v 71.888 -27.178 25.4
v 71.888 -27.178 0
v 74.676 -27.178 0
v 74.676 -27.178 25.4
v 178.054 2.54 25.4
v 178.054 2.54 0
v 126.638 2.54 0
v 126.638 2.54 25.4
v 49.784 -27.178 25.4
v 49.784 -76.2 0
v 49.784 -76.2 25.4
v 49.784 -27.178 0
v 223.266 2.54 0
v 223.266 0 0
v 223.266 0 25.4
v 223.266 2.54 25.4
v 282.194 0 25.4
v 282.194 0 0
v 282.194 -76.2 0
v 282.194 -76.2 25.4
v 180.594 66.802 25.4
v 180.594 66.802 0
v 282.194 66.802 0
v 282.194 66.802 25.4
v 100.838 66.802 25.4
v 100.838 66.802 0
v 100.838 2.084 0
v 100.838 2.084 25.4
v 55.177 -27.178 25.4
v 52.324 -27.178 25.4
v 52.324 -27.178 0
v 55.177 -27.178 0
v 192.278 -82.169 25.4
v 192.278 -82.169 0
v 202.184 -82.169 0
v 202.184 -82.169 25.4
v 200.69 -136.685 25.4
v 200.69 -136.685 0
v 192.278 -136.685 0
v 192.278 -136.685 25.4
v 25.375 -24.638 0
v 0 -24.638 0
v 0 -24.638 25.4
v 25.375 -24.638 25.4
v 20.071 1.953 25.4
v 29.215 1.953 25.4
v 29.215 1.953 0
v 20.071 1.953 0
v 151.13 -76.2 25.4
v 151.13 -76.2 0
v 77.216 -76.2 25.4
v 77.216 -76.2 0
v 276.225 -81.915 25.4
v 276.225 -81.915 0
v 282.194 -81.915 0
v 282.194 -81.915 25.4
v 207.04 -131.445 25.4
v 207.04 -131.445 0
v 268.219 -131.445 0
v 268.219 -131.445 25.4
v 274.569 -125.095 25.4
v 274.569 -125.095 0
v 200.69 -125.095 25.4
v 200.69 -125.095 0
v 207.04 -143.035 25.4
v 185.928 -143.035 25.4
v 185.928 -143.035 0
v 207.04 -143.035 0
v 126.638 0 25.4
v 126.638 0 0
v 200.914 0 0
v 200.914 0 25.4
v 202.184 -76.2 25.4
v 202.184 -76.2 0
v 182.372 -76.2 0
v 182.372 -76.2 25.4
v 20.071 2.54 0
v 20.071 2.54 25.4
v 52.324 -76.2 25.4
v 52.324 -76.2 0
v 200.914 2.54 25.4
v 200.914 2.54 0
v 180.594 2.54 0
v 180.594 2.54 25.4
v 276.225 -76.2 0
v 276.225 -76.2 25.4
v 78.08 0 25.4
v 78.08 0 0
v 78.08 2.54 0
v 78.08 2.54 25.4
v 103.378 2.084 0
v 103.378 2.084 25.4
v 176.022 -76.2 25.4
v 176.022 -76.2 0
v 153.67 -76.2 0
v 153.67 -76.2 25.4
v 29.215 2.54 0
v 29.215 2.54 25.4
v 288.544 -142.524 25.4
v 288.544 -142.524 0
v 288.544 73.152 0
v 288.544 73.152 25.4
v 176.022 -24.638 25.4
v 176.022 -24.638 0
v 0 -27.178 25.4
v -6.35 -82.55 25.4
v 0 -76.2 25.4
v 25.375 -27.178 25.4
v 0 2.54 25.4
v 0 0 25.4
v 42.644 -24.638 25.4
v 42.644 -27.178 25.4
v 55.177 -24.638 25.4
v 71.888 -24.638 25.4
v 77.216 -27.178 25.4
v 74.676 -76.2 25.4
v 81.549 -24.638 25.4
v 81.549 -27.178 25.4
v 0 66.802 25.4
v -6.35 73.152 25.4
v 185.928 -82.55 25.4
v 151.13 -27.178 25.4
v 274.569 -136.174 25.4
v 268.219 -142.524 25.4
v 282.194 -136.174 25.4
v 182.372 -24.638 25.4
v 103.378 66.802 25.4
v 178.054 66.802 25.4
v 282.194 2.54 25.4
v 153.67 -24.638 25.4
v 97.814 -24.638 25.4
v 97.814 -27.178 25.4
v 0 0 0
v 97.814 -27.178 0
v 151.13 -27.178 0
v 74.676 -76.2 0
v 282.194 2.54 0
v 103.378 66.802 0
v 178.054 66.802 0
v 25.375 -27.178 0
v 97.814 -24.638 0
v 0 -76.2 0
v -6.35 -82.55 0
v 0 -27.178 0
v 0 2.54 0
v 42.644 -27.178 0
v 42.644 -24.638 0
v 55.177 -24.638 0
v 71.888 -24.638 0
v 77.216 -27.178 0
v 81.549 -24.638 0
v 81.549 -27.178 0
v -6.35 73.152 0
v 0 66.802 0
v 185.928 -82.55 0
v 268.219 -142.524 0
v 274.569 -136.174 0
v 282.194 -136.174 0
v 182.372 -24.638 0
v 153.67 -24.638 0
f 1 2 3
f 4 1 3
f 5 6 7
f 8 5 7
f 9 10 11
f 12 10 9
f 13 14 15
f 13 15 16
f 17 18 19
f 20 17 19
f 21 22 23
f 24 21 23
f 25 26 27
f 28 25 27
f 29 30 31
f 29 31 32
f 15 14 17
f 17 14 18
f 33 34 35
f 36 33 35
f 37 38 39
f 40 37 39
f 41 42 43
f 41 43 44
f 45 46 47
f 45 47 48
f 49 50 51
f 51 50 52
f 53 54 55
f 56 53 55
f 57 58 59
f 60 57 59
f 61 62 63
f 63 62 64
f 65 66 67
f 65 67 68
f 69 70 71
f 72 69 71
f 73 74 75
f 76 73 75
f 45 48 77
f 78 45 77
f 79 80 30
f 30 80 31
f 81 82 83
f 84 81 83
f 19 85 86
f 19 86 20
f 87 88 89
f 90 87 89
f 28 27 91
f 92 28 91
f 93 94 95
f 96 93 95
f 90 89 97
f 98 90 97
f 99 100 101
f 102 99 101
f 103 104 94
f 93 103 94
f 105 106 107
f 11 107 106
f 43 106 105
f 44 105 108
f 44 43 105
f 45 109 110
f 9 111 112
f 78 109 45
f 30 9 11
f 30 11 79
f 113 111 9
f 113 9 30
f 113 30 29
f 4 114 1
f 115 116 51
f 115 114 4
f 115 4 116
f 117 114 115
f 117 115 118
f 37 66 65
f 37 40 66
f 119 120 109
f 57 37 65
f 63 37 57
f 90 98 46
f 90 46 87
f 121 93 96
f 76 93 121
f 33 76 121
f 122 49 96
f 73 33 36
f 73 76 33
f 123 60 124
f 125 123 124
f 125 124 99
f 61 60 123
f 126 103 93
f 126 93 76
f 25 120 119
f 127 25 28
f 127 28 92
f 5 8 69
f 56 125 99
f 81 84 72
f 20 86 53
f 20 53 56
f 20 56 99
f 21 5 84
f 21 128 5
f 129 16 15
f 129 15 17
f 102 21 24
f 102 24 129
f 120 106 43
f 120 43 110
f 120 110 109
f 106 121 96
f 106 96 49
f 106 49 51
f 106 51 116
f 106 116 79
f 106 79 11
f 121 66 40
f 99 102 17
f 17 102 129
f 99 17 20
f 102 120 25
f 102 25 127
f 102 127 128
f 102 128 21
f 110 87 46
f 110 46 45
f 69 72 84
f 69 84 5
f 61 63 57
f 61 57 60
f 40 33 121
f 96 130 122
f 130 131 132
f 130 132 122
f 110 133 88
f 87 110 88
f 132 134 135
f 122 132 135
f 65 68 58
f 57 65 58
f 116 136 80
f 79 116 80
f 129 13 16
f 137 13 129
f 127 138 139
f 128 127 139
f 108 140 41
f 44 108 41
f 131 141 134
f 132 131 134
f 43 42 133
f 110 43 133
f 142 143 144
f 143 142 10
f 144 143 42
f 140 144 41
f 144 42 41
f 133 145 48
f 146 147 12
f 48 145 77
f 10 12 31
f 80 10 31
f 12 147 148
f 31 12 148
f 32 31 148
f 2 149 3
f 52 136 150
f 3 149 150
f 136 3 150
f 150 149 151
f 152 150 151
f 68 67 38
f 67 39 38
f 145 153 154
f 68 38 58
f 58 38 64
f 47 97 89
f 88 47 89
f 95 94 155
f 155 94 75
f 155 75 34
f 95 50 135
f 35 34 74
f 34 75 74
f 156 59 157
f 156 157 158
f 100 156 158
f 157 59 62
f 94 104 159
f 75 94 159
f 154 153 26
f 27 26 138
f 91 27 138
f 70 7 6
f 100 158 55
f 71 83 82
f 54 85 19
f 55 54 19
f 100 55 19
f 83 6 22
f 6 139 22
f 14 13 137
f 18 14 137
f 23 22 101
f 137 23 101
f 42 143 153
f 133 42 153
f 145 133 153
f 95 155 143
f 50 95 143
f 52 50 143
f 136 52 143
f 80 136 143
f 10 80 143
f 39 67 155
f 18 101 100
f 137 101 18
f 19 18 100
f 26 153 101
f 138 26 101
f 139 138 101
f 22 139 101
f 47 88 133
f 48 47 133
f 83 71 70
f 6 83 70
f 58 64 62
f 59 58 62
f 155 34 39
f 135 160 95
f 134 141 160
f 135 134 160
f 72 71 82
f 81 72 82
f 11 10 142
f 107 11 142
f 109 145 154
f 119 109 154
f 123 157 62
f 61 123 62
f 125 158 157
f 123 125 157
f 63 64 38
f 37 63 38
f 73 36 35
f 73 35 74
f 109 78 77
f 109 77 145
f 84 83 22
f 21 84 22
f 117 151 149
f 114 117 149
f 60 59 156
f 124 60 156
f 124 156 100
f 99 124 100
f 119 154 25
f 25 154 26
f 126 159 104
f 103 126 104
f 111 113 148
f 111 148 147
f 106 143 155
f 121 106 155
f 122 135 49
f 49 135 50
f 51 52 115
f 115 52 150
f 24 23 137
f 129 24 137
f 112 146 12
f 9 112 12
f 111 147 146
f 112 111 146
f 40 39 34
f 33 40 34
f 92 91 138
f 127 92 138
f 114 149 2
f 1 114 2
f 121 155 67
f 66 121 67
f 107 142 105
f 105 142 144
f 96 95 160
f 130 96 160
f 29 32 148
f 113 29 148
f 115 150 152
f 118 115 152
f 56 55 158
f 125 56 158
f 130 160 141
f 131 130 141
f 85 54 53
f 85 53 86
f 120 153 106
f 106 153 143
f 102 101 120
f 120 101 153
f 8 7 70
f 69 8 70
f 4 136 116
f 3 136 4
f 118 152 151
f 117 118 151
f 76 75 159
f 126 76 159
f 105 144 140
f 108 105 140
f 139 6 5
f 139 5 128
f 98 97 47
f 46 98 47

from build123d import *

# Parameters (mm, degrees)
F0_W     = 2.54
F0_H     = 64.262
F0_W_2   = 58.928
F0_H_2   = 2.54
F0_W_3   = 9.906
F0_H_3   = 5.969
F0_W_4   = 5.969
F0_H_4   = 5.715
F0_H_5   = 49.022
F0_W_5   = 25.3746
F1_DEPTH = 25.4


# Not quite as in the source:
# - a feature names something its author has since deleted; it is built from what else it names


with BuildPart() as f1:
    # F0 (on Top) → F1 (new body)
    with BuildSketch(Plane.XY):
        Polygon((-6.35, 73.152), (-6.35, -82.55), (185.928, -82.55), (185.928, -143.0351776838), (207.0404606759, -143.0351776838), (207.0404606759, -131.445), (268.2187365532, -131.445), (268.2187365532, -142.524239029), (288.544, -142.524239029), (288.544, -81.915), (288.544, 73.152), align=None)
        Polygon((0, 61.5773126483), (0, 66.802), (77.6735246181, 66.802), (100.838, 66.802), (103.378, 66.802), (178.054, 66.802), (180.594, 66.802), (282.194, 66.802), (282.194, 48.7640425563), (282.194, 2.54), (282.194, 0), (282.194, -64.607180655), (282.194, -76.2), (282.194, -81.915), (282.194, -136.174239029), (274.5687365532, -136.174239029), (274.5687365532, -125.095), (200.6904606759, -125.095), (200.6904606759, -136.6851776838), (192.278, -136.6851776838), (192.278, -82.169), (192.278, -76.2), (182.372, -76.2), (176.022, -76.2), (153.67, -76.2), (151.13, -76.2), (77.216, -76.2), (74.676, -76.2), (52.324, -76.2), (49.784, -76.2), (0, -76.2), (0, -27.178), (0, -24.638), (0, 0), (0, 2.54), (0, 17.2067563981), (0, 18.169073388), (0, 22.6956792176), align=None, mode=Mode.SUBTRACT)
        Polygon((18.6906643212, 2.54), (0, 2.54), (0, 0), (78.0796, 0), (78.0796, 2.54), (68.6789600206, 2.54), (68.1948126652, 2.54), (29.4852126652, 2.54), (29.2154226812, 2.54), (29.2154226812, 1.9534120802), (20.0714226812, 1.9534120802), (20.0714226812, 2.54), (19.6596, 2.54), align=None)
        Polygon((103.378, 66.802), (100.838, 66.802), (100.838, 48.322211951), (100.838, 2.0835588062), (103.378, 2.0835588062), align=None)
        Polygon((180.594, 2.54), (178.054, 2.54), (126.6382832546, 2.54), (126.6382832546, 0), (200.914, 0), (200.914, 2.54), (198.7368017435, 2.54), align=None)
        with Locations((179.324, 34.671)):
            Rectangle(F0_W, F0_H)
        with Locations((252.73, 1.27)):
            Rectangle(F0_W_2, F0_H_2)
        Polygon((176.022, -72.2413137555), (176.022, -76.2), (182.372, -76.2), (182.372, -66.0237371922), (182.372, -29.6653471887), (182.372, -24.638), (176.022, -24.638), (176.022, -31.1945881695), (176.022, -37.9491113126), (176.022, -44.4958023727), (176.022, -51.689), (176.022, -58.7322562933), (176.022, -65.4867812991), align=None)
        with Locations((197.231, -79.1845)):
            Rectangle(F0_W_3, F0_H_3)
        with Locations((279.2095, -79.0575)):
            Rectangle(F0_W_4, F0_H_4)
        Polygon((151.13, -64.7879913449), (151.13, -76.2), (153.67, -76.2), (153.67, -72.2413137555), (153.67, -65.4867812991), (153.67, -58.7322562933), (153.67, -51.689), (153.67, -46.2308526039), (153.67, -44.4958023727), (153.67, -37.9491113126), (153.67, -31.1945881695), (153.67, -27.178), (151.13, -27.178), (151.13, -46.2308526039), align=None)
        Polygon((97.8137195742, -27.178), (151.13, -27.178), (153.67, -27.178), (153.67, -24.638), (97.8137195742, -24.638), align=None)
        with Locations((75.946, -51.689)):
            Rectangle(F0_W, F0_H_5)
        Polygon((71.8879923224, -27.178), (74.676, -27.178), (77.216, -27.178), (81.5490037203, -27.178), (81.5490037203, -24.638), (71.8879923224, -24.638), align=None)
        with Locations((51.054, -51.689)):
            Rectangle(F0_W, F0_H_5)
        Polygon((42.6438264549, -27.178), (49.784, -27.178), (52.324, -27.178), (55.1770441234, -27.178), (55.1770441234, -24.638), (42.6438264549, -24.638), align=None)
        with Locations((12.6873, -25.908)):
            Rectangle(F0_W_5, F0_H_2)
    extrude(amount=F1_DEPTH)


solid = f1.part
